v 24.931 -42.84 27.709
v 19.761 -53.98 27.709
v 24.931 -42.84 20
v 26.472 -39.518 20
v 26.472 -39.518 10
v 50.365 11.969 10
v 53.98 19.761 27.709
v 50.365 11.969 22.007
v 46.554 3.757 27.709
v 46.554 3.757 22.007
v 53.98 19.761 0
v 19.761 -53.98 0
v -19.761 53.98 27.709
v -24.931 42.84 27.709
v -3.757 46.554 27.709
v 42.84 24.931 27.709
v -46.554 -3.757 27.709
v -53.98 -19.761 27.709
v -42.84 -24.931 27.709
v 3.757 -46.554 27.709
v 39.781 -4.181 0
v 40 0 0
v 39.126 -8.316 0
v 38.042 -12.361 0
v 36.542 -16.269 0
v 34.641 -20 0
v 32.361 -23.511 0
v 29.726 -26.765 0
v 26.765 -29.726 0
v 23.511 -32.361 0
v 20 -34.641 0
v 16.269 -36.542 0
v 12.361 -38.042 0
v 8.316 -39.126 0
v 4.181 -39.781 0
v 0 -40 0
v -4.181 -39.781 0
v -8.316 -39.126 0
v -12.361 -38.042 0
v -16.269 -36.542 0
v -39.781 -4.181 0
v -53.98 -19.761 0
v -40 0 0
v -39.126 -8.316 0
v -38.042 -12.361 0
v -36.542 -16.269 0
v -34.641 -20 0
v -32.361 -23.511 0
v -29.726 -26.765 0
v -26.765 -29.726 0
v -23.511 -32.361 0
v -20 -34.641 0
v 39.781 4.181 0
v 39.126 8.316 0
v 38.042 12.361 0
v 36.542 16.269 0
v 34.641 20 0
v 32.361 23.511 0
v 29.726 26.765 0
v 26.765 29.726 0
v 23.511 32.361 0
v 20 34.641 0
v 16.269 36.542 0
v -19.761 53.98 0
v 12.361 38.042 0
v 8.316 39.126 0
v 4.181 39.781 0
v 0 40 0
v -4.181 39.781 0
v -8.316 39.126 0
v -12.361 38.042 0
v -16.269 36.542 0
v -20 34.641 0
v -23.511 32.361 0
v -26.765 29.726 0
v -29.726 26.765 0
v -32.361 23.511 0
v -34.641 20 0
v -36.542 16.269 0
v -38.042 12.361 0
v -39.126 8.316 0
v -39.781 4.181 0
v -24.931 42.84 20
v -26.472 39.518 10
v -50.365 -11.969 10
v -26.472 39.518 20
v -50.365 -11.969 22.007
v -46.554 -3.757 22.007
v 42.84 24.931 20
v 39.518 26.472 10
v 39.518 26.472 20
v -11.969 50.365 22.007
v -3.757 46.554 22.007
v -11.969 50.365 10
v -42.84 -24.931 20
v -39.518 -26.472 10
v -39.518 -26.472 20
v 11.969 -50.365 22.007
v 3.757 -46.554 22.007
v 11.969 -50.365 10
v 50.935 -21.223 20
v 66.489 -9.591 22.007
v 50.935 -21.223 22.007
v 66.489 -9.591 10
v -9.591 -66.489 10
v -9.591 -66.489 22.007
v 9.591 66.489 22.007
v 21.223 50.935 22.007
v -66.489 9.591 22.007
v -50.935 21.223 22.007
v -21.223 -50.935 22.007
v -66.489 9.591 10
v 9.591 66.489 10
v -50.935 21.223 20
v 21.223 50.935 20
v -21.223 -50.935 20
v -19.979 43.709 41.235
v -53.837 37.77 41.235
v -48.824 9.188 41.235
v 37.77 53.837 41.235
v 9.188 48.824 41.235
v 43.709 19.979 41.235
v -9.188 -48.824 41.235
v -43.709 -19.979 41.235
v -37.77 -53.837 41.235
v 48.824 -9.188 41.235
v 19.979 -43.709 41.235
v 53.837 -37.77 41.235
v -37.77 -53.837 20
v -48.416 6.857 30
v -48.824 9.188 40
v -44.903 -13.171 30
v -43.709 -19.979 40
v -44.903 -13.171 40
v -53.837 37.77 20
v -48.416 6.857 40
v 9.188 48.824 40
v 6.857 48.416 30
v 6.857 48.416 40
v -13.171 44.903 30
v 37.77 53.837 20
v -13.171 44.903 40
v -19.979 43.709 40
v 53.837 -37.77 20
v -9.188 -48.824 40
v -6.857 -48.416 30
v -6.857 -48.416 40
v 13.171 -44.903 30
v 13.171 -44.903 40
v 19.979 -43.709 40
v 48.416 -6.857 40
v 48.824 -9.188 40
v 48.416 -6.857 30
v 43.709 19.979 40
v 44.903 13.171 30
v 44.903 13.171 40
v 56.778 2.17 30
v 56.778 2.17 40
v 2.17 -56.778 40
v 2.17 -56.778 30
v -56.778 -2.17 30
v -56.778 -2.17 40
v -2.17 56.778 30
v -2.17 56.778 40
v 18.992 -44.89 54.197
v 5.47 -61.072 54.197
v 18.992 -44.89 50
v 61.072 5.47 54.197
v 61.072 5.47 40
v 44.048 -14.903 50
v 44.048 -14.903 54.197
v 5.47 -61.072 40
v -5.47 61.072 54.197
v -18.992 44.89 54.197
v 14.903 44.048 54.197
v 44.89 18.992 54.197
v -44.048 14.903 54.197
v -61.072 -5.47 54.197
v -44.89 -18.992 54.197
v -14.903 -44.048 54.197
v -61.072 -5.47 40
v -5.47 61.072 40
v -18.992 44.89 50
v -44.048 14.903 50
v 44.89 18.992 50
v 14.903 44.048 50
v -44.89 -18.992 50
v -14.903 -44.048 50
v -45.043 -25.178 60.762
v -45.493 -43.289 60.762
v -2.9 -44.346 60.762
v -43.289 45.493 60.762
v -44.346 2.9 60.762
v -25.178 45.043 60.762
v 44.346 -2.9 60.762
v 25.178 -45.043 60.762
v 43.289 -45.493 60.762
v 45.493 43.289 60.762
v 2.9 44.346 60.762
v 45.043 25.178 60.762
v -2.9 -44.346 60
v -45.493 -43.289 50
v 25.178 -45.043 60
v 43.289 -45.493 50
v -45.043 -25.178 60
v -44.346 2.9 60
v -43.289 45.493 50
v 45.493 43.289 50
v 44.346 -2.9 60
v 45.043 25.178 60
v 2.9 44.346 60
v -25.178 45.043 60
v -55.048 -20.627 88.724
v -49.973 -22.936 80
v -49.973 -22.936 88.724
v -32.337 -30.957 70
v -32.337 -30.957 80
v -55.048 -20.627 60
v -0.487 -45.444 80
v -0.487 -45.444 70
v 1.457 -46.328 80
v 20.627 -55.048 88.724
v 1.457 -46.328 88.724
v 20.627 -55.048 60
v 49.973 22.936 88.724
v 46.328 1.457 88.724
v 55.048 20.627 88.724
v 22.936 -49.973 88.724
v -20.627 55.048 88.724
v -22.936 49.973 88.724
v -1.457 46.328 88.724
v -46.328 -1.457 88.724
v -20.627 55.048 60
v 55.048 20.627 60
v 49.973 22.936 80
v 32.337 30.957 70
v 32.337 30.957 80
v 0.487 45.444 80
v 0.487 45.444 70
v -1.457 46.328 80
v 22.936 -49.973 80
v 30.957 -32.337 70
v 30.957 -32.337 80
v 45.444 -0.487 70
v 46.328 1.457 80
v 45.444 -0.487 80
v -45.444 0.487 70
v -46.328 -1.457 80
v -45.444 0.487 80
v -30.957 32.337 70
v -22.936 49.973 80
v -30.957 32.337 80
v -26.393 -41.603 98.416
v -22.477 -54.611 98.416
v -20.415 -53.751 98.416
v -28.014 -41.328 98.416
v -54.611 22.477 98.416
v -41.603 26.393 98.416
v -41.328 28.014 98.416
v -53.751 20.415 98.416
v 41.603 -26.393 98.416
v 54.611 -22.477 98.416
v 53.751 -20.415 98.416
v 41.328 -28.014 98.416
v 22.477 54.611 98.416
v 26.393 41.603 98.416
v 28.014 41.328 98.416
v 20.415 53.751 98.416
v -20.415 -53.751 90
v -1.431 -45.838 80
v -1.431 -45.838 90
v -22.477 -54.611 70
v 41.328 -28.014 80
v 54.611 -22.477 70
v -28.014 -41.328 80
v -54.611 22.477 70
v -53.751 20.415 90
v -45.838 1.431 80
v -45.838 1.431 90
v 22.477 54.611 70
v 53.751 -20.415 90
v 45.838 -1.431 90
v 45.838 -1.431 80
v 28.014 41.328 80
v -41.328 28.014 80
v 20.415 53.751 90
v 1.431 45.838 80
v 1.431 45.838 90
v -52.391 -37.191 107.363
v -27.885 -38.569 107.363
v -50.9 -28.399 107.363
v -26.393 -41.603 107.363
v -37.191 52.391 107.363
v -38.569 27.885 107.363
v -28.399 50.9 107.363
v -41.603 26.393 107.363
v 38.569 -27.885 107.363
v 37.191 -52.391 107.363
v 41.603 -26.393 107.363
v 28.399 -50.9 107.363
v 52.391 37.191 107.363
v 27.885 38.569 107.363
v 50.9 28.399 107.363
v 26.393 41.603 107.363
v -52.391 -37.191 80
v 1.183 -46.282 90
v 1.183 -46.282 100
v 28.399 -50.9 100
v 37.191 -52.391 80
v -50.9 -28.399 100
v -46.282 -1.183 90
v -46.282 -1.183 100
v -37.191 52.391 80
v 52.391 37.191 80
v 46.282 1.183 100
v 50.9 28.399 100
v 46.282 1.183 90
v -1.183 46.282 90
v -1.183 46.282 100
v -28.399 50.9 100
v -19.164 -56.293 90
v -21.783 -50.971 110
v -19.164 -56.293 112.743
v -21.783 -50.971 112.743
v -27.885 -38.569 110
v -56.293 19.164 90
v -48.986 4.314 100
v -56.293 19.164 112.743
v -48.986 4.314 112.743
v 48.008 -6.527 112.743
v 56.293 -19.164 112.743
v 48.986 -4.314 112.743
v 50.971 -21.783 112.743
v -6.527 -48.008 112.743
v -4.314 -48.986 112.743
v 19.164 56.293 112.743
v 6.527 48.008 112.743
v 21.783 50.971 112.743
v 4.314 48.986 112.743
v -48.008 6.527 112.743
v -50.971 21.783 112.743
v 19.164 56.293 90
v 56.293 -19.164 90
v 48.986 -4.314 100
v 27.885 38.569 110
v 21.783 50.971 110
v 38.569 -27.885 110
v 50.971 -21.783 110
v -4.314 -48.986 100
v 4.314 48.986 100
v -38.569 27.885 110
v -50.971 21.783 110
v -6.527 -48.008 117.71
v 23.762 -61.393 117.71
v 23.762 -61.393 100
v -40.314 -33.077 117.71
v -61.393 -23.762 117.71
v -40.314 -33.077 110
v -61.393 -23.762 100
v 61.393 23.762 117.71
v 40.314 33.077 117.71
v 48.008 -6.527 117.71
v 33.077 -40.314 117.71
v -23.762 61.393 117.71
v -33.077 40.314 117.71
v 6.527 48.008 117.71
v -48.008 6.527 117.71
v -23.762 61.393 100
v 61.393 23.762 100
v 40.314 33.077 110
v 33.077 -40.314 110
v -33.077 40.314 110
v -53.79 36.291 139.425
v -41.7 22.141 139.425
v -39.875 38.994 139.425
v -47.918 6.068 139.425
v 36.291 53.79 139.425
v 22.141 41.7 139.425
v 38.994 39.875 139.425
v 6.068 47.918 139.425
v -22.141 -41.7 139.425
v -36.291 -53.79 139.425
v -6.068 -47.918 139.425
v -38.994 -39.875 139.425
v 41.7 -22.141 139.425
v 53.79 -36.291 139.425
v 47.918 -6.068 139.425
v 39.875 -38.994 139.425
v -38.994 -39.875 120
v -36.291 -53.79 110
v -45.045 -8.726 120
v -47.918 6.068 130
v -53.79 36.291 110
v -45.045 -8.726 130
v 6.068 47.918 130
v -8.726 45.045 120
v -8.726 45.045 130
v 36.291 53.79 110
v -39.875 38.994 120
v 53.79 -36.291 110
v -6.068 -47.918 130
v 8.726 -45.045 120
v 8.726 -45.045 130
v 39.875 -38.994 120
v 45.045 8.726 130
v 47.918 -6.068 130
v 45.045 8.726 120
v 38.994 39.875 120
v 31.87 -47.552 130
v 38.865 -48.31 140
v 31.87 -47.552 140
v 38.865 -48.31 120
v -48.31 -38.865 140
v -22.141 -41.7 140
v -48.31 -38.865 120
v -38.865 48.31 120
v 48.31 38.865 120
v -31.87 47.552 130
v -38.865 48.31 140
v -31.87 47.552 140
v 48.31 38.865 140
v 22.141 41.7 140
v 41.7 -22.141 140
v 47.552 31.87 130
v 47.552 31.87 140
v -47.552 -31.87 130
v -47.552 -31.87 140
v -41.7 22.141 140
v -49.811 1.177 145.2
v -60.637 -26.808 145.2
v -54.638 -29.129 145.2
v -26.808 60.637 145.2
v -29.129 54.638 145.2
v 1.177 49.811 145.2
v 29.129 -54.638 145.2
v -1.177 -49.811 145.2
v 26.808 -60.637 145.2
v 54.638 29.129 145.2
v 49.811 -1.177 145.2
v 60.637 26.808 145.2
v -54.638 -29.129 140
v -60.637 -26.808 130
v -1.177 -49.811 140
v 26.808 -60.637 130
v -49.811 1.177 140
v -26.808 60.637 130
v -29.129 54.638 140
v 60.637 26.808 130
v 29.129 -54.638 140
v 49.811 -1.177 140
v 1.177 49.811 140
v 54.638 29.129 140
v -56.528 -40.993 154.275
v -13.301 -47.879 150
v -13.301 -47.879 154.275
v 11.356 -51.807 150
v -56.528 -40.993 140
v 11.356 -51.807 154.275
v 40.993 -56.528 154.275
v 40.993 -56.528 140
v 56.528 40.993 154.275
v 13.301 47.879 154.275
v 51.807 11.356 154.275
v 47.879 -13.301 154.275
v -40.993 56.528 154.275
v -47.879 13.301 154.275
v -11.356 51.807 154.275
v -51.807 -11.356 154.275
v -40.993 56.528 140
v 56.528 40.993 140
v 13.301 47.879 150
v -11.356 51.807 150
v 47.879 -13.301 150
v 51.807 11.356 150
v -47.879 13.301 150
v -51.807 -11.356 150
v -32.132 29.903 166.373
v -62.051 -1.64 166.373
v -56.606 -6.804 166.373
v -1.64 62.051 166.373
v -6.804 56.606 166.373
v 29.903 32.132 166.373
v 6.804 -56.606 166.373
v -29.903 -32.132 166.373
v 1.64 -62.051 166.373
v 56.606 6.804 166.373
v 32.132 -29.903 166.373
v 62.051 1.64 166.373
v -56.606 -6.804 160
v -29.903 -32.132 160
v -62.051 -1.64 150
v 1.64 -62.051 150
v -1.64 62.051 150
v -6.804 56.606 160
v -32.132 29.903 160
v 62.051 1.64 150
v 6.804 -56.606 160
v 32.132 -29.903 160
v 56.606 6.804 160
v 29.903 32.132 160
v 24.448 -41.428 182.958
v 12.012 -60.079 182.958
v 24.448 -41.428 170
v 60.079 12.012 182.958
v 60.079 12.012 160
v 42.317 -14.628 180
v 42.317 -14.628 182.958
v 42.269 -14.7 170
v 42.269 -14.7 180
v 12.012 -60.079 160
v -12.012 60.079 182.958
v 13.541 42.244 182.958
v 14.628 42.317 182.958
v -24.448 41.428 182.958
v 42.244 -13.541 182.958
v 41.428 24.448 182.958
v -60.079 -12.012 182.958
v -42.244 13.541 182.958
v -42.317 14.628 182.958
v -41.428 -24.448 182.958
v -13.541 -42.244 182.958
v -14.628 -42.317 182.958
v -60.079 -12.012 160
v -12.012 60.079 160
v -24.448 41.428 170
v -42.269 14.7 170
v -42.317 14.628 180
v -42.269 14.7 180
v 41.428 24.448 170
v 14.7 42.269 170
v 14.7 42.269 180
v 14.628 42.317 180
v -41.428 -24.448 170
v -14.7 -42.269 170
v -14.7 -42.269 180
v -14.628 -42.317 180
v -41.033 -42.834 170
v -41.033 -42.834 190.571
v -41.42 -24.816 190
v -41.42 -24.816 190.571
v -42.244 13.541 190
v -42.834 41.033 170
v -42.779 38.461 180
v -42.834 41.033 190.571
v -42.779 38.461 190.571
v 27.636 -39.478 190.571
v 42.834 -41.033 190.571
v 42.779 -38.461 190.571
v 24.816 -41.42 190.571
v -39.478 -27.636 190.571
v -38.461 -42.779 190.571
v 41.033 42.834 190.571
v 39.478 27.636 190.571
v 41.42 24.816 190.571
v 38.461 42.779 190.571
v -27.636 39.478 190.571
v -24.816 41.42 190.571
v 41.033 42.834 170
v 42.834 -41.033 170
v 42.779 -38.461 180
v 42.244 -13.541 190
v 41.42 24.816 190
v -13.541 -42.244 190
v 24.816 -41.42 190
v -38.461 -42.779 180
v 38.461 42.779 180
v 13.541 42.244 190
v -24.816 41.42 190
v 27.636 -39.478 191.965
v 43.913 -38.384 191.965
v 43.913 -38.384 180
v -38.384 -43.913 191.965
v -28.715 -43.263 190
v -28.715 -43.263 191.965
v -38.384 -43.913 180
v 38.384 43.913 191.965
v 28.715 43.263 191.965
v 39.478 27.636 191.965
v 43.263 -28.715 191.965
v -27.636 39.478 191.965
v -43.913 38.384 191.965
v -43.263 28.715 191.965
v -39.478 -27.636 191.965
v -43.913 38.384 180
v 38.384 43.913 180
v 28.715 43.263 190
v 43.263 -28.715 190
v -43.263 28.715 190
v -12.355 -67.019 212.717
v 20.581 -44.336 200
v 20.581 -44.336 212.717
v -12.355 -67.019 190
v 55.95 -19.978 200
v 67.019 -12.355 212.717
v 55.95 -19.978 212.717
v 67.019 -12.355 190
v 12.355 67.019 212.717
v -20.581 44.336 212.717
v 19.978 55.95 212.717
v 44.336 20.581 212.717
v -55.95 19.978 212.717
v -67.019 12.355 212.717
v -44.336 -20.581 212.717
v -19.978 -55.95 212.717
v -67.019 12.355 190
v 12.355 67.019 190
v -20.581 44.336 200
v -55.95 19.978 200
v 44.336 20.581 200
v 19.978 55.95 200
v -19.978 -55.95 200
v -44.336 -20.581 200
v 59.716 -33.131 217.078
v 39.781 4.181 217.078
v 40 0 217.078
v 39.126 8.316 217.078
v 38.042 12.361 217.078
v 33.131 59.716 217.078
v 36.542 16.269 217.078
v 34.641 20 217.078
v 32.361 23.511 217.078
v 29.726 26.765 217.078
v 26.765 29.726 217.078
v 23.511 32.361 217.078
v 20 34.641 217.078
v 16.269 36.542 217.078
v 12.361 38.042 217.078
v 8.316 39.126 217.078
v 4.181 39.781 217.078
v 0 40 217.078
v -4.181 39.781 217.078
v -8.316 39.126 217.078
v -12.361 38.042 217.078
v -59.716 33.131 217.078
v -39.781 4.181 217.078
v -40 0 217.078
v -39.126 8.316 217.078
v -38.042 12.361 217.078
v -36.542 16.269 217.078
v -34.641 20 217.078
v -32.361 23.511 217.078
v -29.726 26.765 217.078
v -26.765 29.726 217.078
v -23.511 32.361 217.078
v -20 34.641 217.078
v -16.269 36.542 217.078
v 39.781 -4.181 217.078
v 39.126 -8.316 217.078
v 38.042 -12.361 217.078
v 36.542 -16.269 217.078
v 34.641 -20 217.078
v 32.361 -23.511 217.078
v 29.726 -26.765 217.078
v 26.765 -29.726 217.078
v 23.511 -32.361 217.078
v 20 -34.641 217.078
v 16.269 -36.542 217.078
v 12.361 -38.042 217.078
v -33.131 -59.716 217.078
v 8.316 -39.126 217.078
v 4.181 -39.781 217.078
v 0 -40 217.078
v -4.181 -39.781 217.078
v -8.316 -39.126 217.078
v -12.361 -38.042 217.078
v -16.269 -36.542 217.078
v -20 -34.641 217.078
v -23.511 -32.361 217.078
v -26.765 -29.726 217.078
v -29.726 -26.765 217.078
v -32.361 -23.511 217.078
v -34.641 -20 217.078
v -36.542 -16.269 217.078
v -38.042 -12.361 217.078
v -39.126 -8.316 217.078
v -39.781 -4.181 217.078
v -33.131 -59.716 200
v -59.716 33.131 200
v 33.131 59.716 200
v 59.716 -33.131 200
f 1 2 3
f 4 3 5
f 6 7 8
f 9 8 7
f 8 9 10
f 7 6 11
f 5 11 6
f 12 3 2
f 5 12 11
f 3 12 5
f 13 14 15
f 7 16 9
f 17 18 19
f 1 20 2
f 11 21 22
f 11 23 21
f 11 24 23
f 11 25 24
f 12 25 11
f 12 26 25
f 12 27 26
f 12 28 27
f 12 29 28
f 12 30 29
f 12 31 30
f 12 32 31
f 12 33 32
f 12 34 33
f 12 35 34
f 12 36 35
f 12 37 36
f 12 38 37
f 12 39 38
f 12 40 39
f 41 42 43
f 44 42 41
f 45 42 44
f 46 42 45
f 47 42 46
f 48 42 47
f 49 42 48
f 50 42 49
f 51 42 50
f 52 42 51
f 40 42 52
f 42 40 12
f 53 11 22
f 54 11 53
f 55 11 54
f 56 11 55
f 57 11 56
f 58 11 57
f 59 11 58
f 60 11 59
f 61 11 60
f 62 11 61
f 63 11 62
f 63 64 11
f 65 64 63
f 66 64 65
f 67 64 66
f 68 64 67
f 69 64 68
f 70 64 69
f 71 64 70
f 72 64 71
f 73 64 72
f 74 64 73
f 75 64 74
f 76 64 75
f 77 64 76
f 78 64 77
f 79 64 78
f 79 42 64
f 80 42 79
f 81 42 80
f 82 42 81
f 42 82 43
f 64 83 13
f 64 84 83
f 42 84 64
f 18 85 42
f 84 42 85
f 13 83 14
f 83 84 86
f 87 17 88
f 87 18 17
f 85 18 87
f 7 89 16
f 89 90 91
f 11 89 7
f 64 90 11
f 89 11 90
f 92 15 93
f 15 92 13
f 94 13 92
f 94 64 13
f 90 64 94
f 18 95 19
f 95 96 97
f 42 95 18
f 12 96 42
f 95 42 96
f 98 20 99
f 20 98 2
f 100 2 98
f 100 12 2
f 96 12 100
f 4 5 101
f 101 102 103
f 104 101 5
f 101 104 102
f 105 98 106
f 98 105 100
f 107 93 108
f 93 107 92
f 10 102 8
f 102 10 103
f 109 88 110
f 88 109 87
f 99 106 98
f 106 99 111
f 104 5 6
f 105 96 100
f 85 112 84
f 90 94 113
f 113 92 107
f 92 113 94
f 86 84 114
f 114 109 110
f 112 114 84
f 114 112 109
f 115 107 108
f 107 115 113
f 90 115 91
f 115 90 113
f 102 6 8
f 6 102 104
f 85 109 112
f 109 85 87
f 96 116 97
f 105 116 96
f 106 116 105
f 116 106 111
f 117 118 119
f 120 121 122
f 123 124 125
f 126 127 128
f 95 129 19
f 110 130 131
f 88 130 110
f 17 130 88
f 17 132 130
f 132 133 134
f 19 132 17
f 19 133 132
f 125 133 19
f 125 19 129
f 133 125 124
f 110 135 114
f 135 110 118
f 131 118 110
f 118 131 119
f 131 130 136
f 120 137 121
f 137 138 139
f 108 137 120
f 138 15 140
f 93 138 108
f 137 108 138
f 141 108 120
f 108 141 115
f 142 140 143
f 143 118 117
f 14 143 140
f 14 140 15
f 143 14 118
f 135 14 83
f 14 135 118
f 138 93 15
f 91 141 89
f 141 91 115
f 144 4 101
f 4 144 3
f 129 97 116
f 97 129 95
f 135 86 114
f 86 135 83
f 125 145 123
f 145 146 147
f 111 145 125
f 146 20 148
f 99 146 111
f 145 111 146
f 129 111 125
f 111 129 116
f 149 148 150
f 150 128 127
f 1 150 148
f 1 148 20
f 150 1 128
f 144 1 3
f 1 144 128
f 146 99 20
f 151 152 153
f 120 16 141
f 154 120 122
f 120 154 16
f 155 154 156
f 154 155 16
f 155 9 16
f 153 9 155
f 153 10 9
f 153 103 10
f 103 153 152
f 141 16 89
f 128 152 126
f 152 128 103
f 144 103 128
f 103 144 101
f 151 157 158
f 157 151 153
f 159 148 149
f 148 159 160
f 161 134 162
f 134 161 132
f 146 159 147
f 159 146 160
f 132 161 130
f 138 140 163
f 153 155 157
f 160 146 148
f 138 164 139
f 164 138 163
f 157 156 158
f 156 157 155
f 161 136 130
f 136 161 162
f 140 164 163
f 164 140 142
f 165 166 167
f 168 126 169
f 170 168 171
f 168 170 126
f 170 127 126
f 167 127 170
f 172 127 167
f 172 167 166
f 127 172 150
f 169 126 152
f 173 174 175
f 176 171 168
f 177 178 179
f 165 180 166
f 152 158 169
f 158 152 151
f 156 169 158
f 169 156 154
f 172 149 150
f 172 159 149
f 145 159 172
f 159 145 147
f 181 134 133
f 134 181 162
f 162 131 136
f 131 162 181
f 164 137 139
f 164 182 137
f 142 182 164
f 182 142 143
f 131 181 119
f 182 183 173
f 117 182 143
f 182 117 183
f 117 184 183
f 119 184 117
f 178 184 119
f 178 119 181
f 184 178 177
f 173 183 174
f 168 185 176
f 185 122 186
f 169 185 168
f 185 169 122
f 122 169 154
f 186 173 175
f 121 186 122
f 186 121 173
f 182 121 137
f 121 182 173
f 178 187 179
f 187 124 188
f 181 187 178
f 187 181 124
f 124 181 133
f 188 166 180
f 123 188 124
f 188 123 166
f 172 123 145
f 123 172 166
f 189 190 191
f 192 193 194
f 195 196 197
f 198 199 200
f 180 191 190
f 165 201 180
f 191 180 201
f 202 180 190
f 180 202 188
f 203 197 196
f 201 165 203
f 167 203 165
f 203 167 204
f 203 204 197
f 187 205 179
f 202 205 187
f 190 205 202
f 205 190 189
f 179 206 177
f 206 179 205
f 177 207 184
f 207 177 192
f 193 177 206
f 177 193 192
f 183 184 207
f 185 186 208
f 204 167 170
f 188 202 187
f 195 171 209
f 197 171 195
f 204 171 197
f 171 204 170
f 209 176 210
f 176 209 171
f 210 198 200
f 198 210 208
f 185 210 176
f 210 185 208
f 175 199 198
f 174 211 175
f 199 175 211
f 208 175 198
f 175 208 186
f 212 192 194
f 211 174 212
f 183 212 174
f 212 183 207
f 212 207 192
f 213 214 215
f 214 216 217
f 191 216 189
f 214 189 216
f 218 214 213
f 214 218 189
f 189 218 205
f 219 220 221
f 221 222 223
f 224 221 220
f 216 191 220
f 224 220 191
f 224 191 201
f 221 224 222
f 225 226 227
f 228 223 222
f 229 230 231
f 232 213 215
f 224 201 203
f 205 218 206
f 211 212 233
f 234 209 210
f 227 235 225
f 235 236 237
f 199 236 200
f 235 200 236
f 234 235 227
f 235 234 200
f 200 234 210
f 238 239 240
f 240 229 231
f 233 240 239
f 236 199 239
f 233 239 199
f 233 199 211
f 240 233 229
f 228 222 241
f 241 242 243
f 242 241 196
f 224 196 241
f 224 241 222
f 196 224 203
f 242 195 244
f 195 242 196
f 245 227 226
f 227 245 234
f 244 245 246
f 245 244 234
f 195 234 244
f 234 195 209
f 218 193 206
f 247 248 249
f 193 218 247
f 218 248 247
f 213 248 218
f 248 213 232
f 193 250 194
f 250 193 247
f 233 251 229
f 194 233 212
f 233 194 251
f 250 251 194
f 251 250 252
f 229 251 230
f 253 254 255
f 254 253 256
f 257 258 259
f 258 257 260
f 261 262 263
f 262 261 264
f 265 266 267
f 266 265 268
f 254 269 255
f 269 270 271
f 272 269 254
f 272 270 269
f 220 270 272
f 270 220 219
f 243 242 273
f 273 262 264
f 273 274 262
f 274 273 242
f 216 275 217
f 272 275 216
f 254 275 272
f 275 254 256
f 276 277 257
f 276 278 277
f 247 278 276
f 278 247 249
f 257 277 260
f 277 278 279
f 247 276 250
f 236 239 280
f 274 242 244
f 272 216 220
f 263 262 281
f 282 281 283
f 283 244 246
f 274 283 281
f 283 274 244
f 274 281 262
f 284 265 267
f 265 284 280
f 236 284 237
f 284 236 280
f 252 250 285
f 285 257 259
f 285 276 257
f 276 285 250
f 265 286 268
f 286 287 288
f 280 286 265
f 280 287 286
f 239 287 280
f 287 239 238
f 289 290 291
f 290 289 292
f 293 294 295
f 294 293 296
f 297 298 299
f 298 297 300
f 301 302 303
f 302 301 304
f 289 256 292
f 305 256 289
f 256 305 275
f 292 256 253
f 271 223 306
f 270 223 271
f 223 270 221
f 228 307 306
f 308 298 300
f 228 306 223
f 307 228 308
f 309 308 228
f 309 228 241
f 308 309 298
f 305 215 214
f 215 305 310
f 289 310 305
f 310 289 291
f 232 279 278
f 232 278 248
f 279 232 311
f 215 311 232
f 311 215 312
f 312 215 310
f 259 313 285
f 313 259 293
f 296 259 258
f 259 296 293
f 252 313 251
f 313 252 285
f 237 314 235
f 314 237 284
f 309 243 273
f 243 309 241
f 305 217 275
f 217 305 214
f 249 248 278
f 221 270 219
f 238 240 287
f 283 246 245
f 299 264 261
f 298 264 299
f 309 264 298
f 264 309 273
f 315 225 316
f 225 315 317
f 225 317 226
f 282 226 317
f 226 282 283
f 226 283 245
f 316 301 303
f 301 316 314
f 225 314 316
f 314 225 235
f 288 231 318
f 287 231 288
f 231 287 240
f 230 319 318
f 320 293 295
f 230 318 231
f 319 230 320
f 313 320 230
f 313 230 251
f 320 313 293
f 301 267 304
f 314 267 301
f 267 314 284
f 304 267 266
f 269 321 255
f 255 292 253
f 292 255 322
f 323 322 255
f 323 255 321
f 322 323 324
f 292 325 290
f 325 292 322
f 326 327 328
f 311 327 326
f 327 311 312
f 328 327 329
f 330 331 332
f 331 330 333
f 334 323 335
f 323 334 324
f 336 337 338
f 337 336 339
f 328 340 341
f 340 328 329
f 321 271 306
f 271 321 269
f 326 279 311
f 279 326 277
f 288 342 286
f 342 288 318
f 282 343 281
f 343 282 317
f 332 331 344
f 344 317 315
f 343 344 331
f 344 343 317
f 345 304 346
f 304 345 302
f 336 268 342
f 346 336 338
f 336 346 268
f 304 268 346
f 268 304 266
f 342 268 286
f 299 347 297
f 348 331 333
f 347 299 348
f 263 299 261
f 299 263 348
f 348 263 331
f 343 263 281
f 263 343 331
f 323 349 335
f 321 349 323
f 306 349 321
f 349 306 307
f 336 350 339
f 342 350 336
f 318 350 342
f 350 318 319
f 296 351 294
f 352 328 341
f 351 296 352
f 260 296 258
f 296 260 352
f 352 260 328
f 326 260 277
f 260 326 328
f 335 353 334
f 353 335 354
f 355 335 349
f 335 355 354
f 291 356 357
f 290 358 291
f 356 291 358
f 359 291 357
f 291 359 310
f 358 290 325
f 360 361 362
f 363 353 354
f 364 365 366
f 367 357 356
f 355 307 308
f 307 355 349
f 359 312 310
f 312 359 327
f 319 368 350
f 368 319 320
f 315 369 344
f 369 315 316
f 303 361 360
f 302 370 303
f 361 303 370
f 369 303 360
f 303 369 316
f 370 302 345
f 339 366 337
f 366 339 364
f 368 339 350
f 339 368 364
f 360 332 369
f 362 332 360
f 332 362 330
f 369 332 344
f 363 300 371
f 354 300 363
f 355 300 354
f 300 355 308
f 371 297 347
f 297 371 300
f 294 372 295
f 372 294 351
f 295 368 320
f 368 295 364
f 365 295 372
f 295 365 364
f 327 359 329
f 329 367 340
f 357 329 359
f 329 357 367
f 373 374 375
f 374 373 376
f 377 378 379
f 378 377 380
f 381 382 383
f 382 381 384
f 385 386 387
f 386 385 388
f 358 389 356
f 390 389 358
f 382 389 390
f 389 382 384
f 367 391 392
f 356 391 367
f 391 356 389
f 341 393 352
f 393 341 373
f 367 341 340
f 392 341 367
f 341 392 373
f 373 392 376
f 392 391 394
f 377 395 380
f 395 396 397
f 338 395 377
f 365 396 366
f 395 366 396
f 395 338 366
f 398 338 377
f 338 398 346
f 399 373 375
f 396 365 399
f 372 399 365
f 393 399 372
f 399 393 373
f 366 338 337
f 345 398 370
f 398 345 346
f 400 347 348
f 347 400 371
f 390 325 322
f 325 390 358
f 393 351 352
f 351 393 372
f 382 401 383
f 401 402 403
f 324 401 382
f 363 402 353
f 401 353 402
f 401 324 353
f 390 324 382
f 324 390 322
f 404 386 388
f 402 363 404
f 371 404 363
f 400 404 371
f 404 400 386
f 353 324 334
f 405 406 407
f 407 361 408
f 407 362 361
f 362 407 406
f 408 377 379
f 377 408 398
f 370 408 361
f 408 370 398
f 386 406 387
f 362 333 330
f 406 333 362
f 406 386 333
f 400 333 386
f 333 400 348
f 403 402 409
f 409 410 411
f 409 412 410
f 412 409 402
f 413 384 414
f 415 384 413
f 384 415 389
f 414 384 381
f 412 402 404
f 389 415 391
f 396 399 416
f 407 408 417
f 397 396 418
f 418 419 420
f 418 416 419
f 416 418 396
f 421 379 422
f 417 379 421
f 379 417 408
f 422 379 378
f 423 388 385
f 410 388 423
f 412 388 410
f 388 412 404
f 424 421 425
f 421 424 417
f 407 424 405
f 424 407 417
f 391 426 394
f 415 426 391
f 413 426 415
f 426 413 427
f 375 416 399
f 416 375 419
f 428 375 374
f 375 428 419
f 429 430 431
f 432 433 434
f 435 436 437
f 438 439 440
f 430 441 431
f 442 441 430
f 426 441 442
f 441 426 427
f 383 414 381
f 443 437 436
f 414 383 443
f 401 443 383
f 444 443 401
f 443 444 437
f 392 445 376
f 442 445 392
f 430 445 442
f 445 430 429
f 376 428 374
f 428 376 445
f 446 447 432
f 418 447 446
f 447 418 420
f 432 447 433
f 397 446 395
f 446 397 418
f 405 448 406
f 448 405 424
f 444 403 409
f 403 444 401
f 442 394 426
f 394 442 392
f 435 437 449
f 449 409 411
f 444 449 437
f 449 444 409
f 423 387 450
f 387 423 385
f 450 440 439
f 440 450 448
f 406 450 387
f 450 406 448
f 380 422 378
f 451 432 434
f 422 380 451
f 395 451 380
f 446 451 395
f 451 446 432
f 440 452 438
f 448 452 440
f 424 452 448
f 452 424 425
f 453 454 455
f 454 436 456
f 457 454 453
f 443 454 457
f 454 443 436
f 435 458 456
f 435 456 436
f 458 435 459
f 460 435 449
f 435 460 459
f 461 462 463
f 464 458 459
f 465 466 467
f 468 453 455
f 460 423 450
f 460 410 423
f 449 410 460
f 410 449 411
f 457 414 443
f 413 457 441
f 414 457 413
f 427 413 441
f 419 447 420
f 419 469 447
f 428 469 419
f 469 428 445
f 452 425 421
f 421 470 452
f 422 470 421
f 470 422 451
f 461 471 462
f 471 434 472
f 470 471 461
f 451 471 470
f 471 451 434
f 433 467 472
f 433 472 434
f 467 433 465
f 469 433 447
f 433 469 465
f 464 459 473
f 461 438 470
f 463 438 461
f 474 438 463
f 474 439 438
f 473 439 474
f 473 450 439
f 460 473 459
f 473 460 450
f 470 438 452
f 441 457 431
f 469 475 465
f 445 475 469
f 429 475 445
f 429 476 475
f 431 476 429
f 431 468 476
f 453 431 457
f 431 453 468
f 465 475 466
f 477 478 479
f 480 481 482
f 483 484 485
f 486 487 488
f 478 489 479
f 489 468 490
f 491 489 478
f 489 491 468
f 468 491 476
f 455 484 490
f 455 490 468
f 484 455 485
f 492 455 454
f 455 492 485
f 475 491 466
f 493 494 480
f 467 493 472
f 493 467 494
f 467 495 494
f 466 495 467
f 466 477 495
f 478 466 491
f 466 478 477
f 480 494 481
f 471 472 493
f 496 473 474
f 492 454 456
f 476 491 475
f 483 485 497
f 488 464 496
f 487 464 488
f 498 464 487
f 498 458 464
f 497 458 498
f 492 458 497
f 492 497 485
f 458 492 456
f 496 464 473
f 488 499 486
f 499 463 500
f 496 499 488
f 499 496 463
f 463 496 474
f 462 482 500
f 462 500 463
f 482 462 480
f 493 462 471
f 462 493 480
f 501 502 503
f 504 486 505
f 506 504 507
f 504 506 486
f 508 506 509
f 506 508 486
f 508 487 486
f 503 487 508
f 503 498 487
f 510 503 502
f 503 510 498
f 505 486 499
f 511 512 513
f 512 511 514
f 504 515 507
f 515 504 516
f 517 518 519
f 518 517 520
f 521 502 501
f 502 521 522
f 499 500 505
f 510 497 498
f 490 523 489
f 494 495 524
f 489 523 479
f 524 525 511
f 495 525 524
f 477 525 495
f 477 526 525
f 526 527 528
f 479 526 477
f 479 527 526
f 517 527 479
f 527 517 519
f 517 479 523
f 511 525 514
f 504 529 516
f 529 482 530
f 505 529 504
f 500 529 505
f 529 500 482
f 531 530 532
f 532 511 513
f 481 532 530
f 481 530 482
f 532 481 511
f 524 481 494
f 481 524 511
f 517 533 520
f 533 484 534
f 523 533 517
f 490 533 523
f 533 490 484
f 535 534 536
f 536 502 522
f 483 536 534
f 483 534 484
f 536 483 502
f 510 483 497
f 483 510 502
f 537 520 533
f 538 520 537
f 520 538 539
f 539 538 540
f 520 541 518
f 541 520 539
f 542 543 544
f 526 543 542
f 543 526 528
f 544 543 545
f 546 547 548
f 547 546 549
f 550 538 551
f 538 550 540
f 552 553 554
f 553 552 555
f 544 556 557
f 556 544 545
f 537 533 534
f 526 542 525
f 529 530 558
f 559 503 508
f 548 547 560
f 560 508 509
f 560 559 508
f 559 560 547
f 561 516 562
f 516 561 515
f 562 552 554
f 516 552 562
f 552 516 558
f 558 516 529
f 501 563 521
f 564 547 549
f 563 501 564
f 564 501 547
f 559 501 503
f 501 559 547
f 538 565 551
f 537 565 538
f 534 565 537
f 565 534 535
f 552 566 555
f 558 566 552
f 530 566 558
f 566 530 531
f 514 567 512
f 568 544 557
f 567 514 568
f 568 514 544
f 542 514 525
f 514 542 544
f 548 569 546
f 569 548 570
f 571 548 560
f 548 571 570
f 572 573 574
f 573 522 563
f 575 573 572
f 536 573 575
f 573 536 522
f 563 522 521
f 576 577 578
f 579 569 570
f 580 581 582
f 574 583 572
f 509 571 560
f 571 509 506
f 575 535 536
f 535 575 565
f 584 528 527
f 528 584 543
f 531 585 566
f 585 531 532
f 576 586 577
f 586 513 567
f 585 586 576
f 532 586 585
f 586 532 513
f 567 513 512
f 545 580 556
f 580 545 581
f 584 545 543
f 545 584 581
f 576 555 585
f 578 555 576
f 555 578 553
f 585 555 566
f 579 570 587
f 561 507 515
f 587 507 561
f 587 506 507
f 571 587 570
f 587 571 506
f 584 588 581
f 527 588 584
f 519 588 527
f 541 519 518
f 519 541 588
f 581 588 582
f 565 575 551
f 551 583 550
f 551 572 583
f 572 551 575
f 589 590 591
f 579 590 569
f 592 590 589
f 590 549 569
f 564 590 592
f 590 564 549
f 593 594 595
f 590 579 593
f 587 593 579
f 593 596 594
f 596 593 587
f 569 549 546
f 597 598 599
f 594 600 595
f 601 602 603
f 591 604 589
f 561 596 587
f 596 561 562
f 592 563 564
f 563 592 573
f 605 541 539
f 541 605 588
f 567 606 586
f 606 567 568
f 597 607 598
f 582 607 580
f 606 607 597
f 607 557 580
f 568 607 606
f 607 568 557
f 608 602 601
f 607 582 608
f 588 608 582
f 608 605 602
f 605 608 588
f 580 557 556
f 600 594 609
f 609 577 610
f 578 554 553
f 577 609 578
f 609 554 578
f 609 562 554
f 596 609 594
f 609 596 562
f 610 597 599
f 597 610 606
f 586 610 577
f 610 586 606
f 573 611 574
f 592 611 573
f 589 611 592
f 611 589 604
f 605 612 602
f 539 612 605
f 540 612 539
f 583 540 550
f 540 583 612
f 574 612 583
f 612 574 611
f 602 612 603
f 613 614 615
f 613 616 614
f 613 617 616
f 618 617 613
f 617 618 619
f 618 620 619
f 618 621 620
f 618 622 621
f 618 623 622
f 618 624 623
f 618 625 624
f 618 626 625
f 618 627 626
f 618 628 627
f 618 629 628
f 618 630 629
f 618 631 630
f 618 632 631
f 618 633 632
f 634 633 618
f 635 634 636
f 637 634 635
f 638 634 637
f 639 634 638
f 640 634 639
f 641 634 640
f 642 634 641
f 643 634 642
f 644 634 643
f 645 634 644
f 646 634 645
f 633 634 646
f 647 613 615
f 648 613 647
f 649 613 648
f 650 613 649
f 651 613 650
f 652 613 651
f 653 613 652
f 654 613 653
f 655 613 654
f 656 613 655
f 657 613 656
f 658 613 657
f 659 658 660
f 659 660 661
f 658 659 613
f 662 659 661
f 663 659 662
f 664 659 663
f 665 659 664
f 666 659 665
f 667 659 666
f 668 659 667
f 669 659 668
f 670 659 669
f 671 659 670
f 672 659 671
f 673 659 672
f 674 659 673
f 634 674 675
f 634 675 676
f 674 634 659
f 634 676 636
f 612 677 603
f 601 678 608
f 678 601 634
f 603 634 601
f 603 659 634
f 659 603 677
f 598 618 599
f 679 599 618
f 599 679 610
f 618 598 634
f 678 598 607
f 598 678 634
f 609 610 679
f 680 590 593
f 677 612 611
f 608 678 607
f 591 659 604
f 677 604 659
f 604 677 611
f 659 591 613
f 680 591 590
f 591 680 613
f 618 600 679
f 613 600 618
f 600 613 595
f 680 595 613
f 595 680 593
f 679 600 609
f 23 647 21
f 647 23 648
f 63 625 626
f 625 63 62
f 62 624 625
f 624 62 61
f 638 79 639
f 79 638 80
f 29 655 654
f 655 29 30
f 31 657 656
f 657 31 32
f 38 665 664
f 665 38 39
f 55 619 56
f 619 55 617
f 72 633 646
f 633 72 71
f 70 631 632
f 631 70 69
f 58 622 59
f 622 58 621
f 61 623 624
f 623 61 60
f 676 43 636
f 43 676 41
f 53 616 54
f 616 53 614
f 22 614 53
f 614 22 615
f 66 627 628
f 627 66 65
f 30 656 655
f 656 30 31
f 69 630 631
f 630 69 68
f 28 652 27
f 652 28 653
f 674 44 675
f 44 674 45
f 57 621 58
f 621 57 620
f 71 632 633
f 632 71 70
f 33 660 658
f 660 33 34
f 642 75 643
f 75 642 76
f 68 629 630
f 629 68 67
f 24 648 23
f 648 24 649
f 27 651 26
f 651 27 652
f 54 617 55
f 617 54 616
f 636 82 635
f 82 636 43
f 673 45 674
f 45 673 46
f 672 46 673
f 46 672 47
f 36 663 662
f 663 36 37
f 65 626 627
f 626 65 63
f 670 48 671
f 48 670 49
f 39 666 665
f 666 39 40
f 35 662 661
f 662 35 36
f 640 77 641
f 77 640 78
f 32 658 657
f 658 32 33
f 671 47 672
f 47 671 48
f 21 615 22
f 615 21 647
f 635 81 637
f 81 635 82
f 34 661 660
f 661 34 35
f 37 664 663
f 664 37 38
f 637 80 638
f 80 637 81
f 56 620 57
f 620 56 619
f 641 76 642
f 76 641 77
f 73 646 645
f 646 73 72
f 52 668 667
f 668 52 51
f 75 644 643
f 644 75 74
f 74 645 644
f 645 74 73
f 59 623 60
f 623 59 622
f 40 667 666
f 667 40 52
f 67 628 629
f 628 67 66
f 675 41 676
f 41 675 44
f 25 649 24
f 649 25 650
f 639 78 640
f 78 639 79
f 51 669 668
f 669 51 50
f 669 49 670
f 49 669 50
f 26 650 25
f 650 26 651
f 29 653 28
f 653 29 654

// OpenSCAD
difference(){
  union(){
    translate(v=[0, 0, 0])
      rotate(a=[0, 0, 335.10686490778824])
        translate(v=[-40.64723454195625, -40.64723454195625, 0])
          cube(size=[81.2944690839125, 81.2944690839125, 27.7093853493636]);
    translate(v=[0, 0, 10])
      rotate(a=[0, 0, 306.791667320328])
        translate(v=[-47.50145378415233, -47.50145378415233, 0])
          cube(size=[95.00290756830466, 95.00290756830466, 12.006746732200174]);
    translate(v=[0, 0, 20])
      rotate(a=[0, 0, 9.947848359239993])
        translate(v=[-46.50310690686278, -46.50310690686278, 0])
          cube(size=[93.00621381372557, 93.00621381372557, 21.23506868116595]);
    translate(v=[0, 0, 30])
      rotate(a=[0, 0, 137.18894939516264])
        translate(v=[-40.17753715054512, -40.17753715054512, 0])
          cube(size=[80.35507430109024, 80.35507430109024, 13.286860145324226]);
    translate(v=[0, 0, 40])
      rotate(a=[0, 0, 320.1184893129439])
        translate(v=[-43.357553953745935, -43.357553953745935, 0])
          cube(size=[86.71510790749187, 86.71510790749187, 14.197196507578255]);
    translate(v=[0, 0, 50])
      rotate(a=[0, 0, 88.5779153498211])
        translate(v=[-44.40456625467261, -44.40456625467261, 0])
          cube(size=[88.80913250934522, 88.80913250934522, 10.761599745559632]);
    translate(v=[0, 0, 60])
      rotate(a=[0, 0, 245.5420040849848])
        translate(v=[-41.56760440091097, -41.56760440091097, 0])
          cube(size=[83.13520880182195, 83.13520880182195, 28.72393211519734]);
    translate(v=[0, 0, 70])
      rotate(a=[0, 0, 112.62865504597595])
        translate(v=[-41.75853343100711, -41.75853343100711, 0])
          cube(size=[83.51706686201422, 83.51706686201422, 28.41639994080033]);
    translate(v=[0, 0, 80])
      rotate(a=[0, 0, 80.36994925862486])
        translate(v=[-45.43150815033656, -45.43150815033656, 0])
          cube(size=[90.86301630067312, 90.86301630067312, 27.363479275711025]);
    translate(v=[0, 0, 90])
      rotate(a=[0, 0, 206.19956759780322])
        translate(v=[-42.04882497828545, -42.04882497828545, 0])
          cube(size=[84.0976499565709, 84.0976499565709, 22.743136264787886]);
    translate(v=[0, 0, 100])
      rotate(a=[0, 0, 246.15867605141074])
        translate(v=[-46.54959208505184, -46.54959208505184, 0])
          cube(size=[93.09918417010368, 93.09918417010368, 17.710216839988497]);
    translate(v=[0, 0, 110])
      rotate(a=[0, 0, 10.99338458779684])
        translate(v=[-45.881979131023094, -45.881979131023094, 0])
          cube(size=[91.76395826204619, 91.76395826204619, 29.42457258129661]);
    translate(v=[0, 0, 120])
      rotate(a=[0, 0, 263.8167577027474])
        translate(v=[-43.84265508420841, -43.84265508420841, 0])
          cube(size=[87.68531016841682, 87.68531016841682, 24.428696937676467]);
    translate(v=[0, 0, 130])
      rotate(a=[0, 0, 68.85072880938756])
        translate(v=[-46.88014433481363, -46.88014433481363, 0])
          cube(size=[93.76028866962726, 93.76028866962726, 15.200290599334014]);
    translate(v=[0, 0, 140])
      rotate(a=[0, 0, 260.94904179785755])
        translate(v=[-49.37550254222592, -49.37550254222592, 0])
          cube(size=[98.75100508445183, 98.75100508445183, 14.275422791992199]);
    translate(v=[0, 0, 150])
      rotate(a=[0, 0, 46.513655244625696])
        translate(v=[-43.89181636534351, -43.89181636534351, 0])
          cube(size=[87.78363273068702, 87.78363273068702, 16.373430914682434]);
    translate(v=[0, 0, 160])
      rotate(a=[0, 0, 326.30632020836106])
        translate(v=[-43.32316163338866, -43.32316163338866, 0])
          cube(size=[86.64632326677732, 86.64632326677732, 22.957596290010983]);
    translate(v=[0, 0, 170])
      rotate(a=[0, 0, 181.23032958554865])
        translate(v=[-41.94340837181703, -41.94340837181703, 0])
          cube(size=[83.88681674363406, 83.88681674363406, 20.571228146615375]);
    translate(v=[0, 0, 180])
      rotate(a=[0, 0, 273.8430562862593])
        translate(v=[-41.24133590928441, -41.24133590928441, 0])
          cube(size=[82.48267181856882, 82.48267181856882, 11.96500625654901]);
    translate(v=[0, 0, 190])
      rotate(a=[0, 0, 304.555115636038])
        translate(v=[-48.188347367473895, -48.188347367473895, 0])
          cube(size=[96.37669473494779, 96.37669473494779, 22.717066306772782]);
    translate(v=[0, 0, 200])
      rotate(a=[0, 0, 15.978226980013575])
        translate(v=[-48.28905354713788, -48.28905354713788, 0])
          cube(size=[96.57810709427577, 96.57810709427577, 17.0777915529295]);
  }
  translate(v=[0, 0, -500])
    cylinder(h=1000, d1=80, d2=80, $fa=6, $fs=0.5);
}
